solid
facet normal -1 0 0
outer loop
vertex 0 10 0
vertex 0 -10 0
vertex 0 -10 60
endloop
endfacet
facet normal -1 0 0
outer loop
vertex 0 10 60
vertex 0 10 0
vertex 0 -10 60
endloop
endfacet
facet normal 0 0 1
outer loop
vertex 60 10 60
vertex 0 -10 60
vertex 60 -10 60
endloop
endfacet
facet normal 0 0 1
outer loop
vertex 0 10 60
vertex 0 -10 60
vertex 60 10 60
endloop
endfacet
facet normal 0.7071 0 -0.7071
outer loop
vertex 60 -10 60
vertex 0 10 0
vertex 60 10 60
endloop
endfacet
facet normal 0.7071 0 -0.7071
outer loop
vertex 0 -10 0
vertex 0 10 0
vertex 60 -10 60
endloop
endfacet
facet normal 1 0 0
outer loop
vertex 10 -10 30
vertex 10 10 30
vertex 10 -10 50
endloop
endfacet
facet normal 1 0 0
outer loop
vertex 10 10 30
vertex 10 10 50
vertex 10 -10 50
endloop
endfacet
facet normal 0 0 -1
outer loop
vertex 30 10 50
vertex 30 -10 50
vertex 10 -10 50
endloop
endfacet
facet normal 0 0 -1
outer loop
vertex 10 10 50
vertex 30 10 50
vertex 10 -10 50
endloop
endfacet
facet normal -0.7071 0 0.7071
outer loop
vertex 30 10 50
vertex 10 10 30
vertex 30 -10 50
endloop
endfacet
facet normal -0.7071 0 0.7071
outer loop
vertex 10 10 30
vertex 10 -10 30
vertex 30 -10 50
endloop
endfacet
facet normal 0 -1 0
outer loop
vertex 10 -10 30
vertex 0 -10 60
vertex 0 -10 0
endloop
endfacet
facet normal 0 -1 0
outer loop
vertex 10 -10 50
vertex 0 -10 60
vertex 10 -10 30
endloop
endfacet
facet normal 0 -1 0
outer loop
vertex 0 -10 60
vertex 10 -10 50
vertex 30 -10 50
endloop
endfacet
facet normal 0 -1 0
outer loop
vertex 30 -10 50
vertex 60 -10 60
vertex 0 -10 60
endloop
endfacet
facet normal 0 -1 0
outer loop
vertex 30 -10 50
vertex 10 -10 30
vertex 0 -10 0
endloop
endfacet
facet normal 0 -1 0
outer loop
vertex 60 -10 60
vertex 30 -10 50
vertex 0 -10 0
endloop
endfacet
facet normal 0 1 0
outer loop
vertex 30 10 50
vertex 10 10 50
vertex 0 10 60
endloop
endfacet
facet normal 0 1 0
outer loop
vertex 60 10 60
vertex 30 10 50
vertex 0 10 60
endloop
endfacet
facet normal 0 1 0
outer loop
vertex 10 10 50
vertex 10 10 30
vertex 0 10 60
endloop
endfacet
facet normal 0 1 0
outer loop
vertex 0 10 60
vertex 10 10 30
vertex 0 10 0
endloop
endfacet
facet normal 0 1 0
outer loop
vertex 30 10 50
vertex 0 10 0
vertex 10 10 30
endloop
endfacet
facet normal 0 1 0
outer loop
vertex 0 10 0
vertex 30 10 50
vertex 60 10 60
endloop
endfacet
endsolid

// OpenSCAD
polyhedron
    (points = [
               [0, -10, 60], [0, 10, 60], [0, 10, 0], [0, -10, 0], [60, -10, 60], [60, 10, 60], 
               [10, -10, 50], [10, 10, 50], [10, 10, 30], [10, -10, 30], [30, -10, 50], [30, 10, 50]
               ], 
     triangles = [
                  [0,3,2],  [0,2,1],  [4,0,5],  [5,0,1],  [5,2,4],  [4,2,3],
                  [6,8,9],  [6,7,8],  [6,10,11],[6,11,7], [10,8,11],
                  [10,9,8], [3,0,9],  [9,0,6],  [10,6, 0],[0,4,10],
                  [3,9,10], [3,10,4], [1,7,11], [1,11,5], [1,8,7],  
                  [2,8,1],  [8,2,11], [5,11,2]
                  ]
     );
